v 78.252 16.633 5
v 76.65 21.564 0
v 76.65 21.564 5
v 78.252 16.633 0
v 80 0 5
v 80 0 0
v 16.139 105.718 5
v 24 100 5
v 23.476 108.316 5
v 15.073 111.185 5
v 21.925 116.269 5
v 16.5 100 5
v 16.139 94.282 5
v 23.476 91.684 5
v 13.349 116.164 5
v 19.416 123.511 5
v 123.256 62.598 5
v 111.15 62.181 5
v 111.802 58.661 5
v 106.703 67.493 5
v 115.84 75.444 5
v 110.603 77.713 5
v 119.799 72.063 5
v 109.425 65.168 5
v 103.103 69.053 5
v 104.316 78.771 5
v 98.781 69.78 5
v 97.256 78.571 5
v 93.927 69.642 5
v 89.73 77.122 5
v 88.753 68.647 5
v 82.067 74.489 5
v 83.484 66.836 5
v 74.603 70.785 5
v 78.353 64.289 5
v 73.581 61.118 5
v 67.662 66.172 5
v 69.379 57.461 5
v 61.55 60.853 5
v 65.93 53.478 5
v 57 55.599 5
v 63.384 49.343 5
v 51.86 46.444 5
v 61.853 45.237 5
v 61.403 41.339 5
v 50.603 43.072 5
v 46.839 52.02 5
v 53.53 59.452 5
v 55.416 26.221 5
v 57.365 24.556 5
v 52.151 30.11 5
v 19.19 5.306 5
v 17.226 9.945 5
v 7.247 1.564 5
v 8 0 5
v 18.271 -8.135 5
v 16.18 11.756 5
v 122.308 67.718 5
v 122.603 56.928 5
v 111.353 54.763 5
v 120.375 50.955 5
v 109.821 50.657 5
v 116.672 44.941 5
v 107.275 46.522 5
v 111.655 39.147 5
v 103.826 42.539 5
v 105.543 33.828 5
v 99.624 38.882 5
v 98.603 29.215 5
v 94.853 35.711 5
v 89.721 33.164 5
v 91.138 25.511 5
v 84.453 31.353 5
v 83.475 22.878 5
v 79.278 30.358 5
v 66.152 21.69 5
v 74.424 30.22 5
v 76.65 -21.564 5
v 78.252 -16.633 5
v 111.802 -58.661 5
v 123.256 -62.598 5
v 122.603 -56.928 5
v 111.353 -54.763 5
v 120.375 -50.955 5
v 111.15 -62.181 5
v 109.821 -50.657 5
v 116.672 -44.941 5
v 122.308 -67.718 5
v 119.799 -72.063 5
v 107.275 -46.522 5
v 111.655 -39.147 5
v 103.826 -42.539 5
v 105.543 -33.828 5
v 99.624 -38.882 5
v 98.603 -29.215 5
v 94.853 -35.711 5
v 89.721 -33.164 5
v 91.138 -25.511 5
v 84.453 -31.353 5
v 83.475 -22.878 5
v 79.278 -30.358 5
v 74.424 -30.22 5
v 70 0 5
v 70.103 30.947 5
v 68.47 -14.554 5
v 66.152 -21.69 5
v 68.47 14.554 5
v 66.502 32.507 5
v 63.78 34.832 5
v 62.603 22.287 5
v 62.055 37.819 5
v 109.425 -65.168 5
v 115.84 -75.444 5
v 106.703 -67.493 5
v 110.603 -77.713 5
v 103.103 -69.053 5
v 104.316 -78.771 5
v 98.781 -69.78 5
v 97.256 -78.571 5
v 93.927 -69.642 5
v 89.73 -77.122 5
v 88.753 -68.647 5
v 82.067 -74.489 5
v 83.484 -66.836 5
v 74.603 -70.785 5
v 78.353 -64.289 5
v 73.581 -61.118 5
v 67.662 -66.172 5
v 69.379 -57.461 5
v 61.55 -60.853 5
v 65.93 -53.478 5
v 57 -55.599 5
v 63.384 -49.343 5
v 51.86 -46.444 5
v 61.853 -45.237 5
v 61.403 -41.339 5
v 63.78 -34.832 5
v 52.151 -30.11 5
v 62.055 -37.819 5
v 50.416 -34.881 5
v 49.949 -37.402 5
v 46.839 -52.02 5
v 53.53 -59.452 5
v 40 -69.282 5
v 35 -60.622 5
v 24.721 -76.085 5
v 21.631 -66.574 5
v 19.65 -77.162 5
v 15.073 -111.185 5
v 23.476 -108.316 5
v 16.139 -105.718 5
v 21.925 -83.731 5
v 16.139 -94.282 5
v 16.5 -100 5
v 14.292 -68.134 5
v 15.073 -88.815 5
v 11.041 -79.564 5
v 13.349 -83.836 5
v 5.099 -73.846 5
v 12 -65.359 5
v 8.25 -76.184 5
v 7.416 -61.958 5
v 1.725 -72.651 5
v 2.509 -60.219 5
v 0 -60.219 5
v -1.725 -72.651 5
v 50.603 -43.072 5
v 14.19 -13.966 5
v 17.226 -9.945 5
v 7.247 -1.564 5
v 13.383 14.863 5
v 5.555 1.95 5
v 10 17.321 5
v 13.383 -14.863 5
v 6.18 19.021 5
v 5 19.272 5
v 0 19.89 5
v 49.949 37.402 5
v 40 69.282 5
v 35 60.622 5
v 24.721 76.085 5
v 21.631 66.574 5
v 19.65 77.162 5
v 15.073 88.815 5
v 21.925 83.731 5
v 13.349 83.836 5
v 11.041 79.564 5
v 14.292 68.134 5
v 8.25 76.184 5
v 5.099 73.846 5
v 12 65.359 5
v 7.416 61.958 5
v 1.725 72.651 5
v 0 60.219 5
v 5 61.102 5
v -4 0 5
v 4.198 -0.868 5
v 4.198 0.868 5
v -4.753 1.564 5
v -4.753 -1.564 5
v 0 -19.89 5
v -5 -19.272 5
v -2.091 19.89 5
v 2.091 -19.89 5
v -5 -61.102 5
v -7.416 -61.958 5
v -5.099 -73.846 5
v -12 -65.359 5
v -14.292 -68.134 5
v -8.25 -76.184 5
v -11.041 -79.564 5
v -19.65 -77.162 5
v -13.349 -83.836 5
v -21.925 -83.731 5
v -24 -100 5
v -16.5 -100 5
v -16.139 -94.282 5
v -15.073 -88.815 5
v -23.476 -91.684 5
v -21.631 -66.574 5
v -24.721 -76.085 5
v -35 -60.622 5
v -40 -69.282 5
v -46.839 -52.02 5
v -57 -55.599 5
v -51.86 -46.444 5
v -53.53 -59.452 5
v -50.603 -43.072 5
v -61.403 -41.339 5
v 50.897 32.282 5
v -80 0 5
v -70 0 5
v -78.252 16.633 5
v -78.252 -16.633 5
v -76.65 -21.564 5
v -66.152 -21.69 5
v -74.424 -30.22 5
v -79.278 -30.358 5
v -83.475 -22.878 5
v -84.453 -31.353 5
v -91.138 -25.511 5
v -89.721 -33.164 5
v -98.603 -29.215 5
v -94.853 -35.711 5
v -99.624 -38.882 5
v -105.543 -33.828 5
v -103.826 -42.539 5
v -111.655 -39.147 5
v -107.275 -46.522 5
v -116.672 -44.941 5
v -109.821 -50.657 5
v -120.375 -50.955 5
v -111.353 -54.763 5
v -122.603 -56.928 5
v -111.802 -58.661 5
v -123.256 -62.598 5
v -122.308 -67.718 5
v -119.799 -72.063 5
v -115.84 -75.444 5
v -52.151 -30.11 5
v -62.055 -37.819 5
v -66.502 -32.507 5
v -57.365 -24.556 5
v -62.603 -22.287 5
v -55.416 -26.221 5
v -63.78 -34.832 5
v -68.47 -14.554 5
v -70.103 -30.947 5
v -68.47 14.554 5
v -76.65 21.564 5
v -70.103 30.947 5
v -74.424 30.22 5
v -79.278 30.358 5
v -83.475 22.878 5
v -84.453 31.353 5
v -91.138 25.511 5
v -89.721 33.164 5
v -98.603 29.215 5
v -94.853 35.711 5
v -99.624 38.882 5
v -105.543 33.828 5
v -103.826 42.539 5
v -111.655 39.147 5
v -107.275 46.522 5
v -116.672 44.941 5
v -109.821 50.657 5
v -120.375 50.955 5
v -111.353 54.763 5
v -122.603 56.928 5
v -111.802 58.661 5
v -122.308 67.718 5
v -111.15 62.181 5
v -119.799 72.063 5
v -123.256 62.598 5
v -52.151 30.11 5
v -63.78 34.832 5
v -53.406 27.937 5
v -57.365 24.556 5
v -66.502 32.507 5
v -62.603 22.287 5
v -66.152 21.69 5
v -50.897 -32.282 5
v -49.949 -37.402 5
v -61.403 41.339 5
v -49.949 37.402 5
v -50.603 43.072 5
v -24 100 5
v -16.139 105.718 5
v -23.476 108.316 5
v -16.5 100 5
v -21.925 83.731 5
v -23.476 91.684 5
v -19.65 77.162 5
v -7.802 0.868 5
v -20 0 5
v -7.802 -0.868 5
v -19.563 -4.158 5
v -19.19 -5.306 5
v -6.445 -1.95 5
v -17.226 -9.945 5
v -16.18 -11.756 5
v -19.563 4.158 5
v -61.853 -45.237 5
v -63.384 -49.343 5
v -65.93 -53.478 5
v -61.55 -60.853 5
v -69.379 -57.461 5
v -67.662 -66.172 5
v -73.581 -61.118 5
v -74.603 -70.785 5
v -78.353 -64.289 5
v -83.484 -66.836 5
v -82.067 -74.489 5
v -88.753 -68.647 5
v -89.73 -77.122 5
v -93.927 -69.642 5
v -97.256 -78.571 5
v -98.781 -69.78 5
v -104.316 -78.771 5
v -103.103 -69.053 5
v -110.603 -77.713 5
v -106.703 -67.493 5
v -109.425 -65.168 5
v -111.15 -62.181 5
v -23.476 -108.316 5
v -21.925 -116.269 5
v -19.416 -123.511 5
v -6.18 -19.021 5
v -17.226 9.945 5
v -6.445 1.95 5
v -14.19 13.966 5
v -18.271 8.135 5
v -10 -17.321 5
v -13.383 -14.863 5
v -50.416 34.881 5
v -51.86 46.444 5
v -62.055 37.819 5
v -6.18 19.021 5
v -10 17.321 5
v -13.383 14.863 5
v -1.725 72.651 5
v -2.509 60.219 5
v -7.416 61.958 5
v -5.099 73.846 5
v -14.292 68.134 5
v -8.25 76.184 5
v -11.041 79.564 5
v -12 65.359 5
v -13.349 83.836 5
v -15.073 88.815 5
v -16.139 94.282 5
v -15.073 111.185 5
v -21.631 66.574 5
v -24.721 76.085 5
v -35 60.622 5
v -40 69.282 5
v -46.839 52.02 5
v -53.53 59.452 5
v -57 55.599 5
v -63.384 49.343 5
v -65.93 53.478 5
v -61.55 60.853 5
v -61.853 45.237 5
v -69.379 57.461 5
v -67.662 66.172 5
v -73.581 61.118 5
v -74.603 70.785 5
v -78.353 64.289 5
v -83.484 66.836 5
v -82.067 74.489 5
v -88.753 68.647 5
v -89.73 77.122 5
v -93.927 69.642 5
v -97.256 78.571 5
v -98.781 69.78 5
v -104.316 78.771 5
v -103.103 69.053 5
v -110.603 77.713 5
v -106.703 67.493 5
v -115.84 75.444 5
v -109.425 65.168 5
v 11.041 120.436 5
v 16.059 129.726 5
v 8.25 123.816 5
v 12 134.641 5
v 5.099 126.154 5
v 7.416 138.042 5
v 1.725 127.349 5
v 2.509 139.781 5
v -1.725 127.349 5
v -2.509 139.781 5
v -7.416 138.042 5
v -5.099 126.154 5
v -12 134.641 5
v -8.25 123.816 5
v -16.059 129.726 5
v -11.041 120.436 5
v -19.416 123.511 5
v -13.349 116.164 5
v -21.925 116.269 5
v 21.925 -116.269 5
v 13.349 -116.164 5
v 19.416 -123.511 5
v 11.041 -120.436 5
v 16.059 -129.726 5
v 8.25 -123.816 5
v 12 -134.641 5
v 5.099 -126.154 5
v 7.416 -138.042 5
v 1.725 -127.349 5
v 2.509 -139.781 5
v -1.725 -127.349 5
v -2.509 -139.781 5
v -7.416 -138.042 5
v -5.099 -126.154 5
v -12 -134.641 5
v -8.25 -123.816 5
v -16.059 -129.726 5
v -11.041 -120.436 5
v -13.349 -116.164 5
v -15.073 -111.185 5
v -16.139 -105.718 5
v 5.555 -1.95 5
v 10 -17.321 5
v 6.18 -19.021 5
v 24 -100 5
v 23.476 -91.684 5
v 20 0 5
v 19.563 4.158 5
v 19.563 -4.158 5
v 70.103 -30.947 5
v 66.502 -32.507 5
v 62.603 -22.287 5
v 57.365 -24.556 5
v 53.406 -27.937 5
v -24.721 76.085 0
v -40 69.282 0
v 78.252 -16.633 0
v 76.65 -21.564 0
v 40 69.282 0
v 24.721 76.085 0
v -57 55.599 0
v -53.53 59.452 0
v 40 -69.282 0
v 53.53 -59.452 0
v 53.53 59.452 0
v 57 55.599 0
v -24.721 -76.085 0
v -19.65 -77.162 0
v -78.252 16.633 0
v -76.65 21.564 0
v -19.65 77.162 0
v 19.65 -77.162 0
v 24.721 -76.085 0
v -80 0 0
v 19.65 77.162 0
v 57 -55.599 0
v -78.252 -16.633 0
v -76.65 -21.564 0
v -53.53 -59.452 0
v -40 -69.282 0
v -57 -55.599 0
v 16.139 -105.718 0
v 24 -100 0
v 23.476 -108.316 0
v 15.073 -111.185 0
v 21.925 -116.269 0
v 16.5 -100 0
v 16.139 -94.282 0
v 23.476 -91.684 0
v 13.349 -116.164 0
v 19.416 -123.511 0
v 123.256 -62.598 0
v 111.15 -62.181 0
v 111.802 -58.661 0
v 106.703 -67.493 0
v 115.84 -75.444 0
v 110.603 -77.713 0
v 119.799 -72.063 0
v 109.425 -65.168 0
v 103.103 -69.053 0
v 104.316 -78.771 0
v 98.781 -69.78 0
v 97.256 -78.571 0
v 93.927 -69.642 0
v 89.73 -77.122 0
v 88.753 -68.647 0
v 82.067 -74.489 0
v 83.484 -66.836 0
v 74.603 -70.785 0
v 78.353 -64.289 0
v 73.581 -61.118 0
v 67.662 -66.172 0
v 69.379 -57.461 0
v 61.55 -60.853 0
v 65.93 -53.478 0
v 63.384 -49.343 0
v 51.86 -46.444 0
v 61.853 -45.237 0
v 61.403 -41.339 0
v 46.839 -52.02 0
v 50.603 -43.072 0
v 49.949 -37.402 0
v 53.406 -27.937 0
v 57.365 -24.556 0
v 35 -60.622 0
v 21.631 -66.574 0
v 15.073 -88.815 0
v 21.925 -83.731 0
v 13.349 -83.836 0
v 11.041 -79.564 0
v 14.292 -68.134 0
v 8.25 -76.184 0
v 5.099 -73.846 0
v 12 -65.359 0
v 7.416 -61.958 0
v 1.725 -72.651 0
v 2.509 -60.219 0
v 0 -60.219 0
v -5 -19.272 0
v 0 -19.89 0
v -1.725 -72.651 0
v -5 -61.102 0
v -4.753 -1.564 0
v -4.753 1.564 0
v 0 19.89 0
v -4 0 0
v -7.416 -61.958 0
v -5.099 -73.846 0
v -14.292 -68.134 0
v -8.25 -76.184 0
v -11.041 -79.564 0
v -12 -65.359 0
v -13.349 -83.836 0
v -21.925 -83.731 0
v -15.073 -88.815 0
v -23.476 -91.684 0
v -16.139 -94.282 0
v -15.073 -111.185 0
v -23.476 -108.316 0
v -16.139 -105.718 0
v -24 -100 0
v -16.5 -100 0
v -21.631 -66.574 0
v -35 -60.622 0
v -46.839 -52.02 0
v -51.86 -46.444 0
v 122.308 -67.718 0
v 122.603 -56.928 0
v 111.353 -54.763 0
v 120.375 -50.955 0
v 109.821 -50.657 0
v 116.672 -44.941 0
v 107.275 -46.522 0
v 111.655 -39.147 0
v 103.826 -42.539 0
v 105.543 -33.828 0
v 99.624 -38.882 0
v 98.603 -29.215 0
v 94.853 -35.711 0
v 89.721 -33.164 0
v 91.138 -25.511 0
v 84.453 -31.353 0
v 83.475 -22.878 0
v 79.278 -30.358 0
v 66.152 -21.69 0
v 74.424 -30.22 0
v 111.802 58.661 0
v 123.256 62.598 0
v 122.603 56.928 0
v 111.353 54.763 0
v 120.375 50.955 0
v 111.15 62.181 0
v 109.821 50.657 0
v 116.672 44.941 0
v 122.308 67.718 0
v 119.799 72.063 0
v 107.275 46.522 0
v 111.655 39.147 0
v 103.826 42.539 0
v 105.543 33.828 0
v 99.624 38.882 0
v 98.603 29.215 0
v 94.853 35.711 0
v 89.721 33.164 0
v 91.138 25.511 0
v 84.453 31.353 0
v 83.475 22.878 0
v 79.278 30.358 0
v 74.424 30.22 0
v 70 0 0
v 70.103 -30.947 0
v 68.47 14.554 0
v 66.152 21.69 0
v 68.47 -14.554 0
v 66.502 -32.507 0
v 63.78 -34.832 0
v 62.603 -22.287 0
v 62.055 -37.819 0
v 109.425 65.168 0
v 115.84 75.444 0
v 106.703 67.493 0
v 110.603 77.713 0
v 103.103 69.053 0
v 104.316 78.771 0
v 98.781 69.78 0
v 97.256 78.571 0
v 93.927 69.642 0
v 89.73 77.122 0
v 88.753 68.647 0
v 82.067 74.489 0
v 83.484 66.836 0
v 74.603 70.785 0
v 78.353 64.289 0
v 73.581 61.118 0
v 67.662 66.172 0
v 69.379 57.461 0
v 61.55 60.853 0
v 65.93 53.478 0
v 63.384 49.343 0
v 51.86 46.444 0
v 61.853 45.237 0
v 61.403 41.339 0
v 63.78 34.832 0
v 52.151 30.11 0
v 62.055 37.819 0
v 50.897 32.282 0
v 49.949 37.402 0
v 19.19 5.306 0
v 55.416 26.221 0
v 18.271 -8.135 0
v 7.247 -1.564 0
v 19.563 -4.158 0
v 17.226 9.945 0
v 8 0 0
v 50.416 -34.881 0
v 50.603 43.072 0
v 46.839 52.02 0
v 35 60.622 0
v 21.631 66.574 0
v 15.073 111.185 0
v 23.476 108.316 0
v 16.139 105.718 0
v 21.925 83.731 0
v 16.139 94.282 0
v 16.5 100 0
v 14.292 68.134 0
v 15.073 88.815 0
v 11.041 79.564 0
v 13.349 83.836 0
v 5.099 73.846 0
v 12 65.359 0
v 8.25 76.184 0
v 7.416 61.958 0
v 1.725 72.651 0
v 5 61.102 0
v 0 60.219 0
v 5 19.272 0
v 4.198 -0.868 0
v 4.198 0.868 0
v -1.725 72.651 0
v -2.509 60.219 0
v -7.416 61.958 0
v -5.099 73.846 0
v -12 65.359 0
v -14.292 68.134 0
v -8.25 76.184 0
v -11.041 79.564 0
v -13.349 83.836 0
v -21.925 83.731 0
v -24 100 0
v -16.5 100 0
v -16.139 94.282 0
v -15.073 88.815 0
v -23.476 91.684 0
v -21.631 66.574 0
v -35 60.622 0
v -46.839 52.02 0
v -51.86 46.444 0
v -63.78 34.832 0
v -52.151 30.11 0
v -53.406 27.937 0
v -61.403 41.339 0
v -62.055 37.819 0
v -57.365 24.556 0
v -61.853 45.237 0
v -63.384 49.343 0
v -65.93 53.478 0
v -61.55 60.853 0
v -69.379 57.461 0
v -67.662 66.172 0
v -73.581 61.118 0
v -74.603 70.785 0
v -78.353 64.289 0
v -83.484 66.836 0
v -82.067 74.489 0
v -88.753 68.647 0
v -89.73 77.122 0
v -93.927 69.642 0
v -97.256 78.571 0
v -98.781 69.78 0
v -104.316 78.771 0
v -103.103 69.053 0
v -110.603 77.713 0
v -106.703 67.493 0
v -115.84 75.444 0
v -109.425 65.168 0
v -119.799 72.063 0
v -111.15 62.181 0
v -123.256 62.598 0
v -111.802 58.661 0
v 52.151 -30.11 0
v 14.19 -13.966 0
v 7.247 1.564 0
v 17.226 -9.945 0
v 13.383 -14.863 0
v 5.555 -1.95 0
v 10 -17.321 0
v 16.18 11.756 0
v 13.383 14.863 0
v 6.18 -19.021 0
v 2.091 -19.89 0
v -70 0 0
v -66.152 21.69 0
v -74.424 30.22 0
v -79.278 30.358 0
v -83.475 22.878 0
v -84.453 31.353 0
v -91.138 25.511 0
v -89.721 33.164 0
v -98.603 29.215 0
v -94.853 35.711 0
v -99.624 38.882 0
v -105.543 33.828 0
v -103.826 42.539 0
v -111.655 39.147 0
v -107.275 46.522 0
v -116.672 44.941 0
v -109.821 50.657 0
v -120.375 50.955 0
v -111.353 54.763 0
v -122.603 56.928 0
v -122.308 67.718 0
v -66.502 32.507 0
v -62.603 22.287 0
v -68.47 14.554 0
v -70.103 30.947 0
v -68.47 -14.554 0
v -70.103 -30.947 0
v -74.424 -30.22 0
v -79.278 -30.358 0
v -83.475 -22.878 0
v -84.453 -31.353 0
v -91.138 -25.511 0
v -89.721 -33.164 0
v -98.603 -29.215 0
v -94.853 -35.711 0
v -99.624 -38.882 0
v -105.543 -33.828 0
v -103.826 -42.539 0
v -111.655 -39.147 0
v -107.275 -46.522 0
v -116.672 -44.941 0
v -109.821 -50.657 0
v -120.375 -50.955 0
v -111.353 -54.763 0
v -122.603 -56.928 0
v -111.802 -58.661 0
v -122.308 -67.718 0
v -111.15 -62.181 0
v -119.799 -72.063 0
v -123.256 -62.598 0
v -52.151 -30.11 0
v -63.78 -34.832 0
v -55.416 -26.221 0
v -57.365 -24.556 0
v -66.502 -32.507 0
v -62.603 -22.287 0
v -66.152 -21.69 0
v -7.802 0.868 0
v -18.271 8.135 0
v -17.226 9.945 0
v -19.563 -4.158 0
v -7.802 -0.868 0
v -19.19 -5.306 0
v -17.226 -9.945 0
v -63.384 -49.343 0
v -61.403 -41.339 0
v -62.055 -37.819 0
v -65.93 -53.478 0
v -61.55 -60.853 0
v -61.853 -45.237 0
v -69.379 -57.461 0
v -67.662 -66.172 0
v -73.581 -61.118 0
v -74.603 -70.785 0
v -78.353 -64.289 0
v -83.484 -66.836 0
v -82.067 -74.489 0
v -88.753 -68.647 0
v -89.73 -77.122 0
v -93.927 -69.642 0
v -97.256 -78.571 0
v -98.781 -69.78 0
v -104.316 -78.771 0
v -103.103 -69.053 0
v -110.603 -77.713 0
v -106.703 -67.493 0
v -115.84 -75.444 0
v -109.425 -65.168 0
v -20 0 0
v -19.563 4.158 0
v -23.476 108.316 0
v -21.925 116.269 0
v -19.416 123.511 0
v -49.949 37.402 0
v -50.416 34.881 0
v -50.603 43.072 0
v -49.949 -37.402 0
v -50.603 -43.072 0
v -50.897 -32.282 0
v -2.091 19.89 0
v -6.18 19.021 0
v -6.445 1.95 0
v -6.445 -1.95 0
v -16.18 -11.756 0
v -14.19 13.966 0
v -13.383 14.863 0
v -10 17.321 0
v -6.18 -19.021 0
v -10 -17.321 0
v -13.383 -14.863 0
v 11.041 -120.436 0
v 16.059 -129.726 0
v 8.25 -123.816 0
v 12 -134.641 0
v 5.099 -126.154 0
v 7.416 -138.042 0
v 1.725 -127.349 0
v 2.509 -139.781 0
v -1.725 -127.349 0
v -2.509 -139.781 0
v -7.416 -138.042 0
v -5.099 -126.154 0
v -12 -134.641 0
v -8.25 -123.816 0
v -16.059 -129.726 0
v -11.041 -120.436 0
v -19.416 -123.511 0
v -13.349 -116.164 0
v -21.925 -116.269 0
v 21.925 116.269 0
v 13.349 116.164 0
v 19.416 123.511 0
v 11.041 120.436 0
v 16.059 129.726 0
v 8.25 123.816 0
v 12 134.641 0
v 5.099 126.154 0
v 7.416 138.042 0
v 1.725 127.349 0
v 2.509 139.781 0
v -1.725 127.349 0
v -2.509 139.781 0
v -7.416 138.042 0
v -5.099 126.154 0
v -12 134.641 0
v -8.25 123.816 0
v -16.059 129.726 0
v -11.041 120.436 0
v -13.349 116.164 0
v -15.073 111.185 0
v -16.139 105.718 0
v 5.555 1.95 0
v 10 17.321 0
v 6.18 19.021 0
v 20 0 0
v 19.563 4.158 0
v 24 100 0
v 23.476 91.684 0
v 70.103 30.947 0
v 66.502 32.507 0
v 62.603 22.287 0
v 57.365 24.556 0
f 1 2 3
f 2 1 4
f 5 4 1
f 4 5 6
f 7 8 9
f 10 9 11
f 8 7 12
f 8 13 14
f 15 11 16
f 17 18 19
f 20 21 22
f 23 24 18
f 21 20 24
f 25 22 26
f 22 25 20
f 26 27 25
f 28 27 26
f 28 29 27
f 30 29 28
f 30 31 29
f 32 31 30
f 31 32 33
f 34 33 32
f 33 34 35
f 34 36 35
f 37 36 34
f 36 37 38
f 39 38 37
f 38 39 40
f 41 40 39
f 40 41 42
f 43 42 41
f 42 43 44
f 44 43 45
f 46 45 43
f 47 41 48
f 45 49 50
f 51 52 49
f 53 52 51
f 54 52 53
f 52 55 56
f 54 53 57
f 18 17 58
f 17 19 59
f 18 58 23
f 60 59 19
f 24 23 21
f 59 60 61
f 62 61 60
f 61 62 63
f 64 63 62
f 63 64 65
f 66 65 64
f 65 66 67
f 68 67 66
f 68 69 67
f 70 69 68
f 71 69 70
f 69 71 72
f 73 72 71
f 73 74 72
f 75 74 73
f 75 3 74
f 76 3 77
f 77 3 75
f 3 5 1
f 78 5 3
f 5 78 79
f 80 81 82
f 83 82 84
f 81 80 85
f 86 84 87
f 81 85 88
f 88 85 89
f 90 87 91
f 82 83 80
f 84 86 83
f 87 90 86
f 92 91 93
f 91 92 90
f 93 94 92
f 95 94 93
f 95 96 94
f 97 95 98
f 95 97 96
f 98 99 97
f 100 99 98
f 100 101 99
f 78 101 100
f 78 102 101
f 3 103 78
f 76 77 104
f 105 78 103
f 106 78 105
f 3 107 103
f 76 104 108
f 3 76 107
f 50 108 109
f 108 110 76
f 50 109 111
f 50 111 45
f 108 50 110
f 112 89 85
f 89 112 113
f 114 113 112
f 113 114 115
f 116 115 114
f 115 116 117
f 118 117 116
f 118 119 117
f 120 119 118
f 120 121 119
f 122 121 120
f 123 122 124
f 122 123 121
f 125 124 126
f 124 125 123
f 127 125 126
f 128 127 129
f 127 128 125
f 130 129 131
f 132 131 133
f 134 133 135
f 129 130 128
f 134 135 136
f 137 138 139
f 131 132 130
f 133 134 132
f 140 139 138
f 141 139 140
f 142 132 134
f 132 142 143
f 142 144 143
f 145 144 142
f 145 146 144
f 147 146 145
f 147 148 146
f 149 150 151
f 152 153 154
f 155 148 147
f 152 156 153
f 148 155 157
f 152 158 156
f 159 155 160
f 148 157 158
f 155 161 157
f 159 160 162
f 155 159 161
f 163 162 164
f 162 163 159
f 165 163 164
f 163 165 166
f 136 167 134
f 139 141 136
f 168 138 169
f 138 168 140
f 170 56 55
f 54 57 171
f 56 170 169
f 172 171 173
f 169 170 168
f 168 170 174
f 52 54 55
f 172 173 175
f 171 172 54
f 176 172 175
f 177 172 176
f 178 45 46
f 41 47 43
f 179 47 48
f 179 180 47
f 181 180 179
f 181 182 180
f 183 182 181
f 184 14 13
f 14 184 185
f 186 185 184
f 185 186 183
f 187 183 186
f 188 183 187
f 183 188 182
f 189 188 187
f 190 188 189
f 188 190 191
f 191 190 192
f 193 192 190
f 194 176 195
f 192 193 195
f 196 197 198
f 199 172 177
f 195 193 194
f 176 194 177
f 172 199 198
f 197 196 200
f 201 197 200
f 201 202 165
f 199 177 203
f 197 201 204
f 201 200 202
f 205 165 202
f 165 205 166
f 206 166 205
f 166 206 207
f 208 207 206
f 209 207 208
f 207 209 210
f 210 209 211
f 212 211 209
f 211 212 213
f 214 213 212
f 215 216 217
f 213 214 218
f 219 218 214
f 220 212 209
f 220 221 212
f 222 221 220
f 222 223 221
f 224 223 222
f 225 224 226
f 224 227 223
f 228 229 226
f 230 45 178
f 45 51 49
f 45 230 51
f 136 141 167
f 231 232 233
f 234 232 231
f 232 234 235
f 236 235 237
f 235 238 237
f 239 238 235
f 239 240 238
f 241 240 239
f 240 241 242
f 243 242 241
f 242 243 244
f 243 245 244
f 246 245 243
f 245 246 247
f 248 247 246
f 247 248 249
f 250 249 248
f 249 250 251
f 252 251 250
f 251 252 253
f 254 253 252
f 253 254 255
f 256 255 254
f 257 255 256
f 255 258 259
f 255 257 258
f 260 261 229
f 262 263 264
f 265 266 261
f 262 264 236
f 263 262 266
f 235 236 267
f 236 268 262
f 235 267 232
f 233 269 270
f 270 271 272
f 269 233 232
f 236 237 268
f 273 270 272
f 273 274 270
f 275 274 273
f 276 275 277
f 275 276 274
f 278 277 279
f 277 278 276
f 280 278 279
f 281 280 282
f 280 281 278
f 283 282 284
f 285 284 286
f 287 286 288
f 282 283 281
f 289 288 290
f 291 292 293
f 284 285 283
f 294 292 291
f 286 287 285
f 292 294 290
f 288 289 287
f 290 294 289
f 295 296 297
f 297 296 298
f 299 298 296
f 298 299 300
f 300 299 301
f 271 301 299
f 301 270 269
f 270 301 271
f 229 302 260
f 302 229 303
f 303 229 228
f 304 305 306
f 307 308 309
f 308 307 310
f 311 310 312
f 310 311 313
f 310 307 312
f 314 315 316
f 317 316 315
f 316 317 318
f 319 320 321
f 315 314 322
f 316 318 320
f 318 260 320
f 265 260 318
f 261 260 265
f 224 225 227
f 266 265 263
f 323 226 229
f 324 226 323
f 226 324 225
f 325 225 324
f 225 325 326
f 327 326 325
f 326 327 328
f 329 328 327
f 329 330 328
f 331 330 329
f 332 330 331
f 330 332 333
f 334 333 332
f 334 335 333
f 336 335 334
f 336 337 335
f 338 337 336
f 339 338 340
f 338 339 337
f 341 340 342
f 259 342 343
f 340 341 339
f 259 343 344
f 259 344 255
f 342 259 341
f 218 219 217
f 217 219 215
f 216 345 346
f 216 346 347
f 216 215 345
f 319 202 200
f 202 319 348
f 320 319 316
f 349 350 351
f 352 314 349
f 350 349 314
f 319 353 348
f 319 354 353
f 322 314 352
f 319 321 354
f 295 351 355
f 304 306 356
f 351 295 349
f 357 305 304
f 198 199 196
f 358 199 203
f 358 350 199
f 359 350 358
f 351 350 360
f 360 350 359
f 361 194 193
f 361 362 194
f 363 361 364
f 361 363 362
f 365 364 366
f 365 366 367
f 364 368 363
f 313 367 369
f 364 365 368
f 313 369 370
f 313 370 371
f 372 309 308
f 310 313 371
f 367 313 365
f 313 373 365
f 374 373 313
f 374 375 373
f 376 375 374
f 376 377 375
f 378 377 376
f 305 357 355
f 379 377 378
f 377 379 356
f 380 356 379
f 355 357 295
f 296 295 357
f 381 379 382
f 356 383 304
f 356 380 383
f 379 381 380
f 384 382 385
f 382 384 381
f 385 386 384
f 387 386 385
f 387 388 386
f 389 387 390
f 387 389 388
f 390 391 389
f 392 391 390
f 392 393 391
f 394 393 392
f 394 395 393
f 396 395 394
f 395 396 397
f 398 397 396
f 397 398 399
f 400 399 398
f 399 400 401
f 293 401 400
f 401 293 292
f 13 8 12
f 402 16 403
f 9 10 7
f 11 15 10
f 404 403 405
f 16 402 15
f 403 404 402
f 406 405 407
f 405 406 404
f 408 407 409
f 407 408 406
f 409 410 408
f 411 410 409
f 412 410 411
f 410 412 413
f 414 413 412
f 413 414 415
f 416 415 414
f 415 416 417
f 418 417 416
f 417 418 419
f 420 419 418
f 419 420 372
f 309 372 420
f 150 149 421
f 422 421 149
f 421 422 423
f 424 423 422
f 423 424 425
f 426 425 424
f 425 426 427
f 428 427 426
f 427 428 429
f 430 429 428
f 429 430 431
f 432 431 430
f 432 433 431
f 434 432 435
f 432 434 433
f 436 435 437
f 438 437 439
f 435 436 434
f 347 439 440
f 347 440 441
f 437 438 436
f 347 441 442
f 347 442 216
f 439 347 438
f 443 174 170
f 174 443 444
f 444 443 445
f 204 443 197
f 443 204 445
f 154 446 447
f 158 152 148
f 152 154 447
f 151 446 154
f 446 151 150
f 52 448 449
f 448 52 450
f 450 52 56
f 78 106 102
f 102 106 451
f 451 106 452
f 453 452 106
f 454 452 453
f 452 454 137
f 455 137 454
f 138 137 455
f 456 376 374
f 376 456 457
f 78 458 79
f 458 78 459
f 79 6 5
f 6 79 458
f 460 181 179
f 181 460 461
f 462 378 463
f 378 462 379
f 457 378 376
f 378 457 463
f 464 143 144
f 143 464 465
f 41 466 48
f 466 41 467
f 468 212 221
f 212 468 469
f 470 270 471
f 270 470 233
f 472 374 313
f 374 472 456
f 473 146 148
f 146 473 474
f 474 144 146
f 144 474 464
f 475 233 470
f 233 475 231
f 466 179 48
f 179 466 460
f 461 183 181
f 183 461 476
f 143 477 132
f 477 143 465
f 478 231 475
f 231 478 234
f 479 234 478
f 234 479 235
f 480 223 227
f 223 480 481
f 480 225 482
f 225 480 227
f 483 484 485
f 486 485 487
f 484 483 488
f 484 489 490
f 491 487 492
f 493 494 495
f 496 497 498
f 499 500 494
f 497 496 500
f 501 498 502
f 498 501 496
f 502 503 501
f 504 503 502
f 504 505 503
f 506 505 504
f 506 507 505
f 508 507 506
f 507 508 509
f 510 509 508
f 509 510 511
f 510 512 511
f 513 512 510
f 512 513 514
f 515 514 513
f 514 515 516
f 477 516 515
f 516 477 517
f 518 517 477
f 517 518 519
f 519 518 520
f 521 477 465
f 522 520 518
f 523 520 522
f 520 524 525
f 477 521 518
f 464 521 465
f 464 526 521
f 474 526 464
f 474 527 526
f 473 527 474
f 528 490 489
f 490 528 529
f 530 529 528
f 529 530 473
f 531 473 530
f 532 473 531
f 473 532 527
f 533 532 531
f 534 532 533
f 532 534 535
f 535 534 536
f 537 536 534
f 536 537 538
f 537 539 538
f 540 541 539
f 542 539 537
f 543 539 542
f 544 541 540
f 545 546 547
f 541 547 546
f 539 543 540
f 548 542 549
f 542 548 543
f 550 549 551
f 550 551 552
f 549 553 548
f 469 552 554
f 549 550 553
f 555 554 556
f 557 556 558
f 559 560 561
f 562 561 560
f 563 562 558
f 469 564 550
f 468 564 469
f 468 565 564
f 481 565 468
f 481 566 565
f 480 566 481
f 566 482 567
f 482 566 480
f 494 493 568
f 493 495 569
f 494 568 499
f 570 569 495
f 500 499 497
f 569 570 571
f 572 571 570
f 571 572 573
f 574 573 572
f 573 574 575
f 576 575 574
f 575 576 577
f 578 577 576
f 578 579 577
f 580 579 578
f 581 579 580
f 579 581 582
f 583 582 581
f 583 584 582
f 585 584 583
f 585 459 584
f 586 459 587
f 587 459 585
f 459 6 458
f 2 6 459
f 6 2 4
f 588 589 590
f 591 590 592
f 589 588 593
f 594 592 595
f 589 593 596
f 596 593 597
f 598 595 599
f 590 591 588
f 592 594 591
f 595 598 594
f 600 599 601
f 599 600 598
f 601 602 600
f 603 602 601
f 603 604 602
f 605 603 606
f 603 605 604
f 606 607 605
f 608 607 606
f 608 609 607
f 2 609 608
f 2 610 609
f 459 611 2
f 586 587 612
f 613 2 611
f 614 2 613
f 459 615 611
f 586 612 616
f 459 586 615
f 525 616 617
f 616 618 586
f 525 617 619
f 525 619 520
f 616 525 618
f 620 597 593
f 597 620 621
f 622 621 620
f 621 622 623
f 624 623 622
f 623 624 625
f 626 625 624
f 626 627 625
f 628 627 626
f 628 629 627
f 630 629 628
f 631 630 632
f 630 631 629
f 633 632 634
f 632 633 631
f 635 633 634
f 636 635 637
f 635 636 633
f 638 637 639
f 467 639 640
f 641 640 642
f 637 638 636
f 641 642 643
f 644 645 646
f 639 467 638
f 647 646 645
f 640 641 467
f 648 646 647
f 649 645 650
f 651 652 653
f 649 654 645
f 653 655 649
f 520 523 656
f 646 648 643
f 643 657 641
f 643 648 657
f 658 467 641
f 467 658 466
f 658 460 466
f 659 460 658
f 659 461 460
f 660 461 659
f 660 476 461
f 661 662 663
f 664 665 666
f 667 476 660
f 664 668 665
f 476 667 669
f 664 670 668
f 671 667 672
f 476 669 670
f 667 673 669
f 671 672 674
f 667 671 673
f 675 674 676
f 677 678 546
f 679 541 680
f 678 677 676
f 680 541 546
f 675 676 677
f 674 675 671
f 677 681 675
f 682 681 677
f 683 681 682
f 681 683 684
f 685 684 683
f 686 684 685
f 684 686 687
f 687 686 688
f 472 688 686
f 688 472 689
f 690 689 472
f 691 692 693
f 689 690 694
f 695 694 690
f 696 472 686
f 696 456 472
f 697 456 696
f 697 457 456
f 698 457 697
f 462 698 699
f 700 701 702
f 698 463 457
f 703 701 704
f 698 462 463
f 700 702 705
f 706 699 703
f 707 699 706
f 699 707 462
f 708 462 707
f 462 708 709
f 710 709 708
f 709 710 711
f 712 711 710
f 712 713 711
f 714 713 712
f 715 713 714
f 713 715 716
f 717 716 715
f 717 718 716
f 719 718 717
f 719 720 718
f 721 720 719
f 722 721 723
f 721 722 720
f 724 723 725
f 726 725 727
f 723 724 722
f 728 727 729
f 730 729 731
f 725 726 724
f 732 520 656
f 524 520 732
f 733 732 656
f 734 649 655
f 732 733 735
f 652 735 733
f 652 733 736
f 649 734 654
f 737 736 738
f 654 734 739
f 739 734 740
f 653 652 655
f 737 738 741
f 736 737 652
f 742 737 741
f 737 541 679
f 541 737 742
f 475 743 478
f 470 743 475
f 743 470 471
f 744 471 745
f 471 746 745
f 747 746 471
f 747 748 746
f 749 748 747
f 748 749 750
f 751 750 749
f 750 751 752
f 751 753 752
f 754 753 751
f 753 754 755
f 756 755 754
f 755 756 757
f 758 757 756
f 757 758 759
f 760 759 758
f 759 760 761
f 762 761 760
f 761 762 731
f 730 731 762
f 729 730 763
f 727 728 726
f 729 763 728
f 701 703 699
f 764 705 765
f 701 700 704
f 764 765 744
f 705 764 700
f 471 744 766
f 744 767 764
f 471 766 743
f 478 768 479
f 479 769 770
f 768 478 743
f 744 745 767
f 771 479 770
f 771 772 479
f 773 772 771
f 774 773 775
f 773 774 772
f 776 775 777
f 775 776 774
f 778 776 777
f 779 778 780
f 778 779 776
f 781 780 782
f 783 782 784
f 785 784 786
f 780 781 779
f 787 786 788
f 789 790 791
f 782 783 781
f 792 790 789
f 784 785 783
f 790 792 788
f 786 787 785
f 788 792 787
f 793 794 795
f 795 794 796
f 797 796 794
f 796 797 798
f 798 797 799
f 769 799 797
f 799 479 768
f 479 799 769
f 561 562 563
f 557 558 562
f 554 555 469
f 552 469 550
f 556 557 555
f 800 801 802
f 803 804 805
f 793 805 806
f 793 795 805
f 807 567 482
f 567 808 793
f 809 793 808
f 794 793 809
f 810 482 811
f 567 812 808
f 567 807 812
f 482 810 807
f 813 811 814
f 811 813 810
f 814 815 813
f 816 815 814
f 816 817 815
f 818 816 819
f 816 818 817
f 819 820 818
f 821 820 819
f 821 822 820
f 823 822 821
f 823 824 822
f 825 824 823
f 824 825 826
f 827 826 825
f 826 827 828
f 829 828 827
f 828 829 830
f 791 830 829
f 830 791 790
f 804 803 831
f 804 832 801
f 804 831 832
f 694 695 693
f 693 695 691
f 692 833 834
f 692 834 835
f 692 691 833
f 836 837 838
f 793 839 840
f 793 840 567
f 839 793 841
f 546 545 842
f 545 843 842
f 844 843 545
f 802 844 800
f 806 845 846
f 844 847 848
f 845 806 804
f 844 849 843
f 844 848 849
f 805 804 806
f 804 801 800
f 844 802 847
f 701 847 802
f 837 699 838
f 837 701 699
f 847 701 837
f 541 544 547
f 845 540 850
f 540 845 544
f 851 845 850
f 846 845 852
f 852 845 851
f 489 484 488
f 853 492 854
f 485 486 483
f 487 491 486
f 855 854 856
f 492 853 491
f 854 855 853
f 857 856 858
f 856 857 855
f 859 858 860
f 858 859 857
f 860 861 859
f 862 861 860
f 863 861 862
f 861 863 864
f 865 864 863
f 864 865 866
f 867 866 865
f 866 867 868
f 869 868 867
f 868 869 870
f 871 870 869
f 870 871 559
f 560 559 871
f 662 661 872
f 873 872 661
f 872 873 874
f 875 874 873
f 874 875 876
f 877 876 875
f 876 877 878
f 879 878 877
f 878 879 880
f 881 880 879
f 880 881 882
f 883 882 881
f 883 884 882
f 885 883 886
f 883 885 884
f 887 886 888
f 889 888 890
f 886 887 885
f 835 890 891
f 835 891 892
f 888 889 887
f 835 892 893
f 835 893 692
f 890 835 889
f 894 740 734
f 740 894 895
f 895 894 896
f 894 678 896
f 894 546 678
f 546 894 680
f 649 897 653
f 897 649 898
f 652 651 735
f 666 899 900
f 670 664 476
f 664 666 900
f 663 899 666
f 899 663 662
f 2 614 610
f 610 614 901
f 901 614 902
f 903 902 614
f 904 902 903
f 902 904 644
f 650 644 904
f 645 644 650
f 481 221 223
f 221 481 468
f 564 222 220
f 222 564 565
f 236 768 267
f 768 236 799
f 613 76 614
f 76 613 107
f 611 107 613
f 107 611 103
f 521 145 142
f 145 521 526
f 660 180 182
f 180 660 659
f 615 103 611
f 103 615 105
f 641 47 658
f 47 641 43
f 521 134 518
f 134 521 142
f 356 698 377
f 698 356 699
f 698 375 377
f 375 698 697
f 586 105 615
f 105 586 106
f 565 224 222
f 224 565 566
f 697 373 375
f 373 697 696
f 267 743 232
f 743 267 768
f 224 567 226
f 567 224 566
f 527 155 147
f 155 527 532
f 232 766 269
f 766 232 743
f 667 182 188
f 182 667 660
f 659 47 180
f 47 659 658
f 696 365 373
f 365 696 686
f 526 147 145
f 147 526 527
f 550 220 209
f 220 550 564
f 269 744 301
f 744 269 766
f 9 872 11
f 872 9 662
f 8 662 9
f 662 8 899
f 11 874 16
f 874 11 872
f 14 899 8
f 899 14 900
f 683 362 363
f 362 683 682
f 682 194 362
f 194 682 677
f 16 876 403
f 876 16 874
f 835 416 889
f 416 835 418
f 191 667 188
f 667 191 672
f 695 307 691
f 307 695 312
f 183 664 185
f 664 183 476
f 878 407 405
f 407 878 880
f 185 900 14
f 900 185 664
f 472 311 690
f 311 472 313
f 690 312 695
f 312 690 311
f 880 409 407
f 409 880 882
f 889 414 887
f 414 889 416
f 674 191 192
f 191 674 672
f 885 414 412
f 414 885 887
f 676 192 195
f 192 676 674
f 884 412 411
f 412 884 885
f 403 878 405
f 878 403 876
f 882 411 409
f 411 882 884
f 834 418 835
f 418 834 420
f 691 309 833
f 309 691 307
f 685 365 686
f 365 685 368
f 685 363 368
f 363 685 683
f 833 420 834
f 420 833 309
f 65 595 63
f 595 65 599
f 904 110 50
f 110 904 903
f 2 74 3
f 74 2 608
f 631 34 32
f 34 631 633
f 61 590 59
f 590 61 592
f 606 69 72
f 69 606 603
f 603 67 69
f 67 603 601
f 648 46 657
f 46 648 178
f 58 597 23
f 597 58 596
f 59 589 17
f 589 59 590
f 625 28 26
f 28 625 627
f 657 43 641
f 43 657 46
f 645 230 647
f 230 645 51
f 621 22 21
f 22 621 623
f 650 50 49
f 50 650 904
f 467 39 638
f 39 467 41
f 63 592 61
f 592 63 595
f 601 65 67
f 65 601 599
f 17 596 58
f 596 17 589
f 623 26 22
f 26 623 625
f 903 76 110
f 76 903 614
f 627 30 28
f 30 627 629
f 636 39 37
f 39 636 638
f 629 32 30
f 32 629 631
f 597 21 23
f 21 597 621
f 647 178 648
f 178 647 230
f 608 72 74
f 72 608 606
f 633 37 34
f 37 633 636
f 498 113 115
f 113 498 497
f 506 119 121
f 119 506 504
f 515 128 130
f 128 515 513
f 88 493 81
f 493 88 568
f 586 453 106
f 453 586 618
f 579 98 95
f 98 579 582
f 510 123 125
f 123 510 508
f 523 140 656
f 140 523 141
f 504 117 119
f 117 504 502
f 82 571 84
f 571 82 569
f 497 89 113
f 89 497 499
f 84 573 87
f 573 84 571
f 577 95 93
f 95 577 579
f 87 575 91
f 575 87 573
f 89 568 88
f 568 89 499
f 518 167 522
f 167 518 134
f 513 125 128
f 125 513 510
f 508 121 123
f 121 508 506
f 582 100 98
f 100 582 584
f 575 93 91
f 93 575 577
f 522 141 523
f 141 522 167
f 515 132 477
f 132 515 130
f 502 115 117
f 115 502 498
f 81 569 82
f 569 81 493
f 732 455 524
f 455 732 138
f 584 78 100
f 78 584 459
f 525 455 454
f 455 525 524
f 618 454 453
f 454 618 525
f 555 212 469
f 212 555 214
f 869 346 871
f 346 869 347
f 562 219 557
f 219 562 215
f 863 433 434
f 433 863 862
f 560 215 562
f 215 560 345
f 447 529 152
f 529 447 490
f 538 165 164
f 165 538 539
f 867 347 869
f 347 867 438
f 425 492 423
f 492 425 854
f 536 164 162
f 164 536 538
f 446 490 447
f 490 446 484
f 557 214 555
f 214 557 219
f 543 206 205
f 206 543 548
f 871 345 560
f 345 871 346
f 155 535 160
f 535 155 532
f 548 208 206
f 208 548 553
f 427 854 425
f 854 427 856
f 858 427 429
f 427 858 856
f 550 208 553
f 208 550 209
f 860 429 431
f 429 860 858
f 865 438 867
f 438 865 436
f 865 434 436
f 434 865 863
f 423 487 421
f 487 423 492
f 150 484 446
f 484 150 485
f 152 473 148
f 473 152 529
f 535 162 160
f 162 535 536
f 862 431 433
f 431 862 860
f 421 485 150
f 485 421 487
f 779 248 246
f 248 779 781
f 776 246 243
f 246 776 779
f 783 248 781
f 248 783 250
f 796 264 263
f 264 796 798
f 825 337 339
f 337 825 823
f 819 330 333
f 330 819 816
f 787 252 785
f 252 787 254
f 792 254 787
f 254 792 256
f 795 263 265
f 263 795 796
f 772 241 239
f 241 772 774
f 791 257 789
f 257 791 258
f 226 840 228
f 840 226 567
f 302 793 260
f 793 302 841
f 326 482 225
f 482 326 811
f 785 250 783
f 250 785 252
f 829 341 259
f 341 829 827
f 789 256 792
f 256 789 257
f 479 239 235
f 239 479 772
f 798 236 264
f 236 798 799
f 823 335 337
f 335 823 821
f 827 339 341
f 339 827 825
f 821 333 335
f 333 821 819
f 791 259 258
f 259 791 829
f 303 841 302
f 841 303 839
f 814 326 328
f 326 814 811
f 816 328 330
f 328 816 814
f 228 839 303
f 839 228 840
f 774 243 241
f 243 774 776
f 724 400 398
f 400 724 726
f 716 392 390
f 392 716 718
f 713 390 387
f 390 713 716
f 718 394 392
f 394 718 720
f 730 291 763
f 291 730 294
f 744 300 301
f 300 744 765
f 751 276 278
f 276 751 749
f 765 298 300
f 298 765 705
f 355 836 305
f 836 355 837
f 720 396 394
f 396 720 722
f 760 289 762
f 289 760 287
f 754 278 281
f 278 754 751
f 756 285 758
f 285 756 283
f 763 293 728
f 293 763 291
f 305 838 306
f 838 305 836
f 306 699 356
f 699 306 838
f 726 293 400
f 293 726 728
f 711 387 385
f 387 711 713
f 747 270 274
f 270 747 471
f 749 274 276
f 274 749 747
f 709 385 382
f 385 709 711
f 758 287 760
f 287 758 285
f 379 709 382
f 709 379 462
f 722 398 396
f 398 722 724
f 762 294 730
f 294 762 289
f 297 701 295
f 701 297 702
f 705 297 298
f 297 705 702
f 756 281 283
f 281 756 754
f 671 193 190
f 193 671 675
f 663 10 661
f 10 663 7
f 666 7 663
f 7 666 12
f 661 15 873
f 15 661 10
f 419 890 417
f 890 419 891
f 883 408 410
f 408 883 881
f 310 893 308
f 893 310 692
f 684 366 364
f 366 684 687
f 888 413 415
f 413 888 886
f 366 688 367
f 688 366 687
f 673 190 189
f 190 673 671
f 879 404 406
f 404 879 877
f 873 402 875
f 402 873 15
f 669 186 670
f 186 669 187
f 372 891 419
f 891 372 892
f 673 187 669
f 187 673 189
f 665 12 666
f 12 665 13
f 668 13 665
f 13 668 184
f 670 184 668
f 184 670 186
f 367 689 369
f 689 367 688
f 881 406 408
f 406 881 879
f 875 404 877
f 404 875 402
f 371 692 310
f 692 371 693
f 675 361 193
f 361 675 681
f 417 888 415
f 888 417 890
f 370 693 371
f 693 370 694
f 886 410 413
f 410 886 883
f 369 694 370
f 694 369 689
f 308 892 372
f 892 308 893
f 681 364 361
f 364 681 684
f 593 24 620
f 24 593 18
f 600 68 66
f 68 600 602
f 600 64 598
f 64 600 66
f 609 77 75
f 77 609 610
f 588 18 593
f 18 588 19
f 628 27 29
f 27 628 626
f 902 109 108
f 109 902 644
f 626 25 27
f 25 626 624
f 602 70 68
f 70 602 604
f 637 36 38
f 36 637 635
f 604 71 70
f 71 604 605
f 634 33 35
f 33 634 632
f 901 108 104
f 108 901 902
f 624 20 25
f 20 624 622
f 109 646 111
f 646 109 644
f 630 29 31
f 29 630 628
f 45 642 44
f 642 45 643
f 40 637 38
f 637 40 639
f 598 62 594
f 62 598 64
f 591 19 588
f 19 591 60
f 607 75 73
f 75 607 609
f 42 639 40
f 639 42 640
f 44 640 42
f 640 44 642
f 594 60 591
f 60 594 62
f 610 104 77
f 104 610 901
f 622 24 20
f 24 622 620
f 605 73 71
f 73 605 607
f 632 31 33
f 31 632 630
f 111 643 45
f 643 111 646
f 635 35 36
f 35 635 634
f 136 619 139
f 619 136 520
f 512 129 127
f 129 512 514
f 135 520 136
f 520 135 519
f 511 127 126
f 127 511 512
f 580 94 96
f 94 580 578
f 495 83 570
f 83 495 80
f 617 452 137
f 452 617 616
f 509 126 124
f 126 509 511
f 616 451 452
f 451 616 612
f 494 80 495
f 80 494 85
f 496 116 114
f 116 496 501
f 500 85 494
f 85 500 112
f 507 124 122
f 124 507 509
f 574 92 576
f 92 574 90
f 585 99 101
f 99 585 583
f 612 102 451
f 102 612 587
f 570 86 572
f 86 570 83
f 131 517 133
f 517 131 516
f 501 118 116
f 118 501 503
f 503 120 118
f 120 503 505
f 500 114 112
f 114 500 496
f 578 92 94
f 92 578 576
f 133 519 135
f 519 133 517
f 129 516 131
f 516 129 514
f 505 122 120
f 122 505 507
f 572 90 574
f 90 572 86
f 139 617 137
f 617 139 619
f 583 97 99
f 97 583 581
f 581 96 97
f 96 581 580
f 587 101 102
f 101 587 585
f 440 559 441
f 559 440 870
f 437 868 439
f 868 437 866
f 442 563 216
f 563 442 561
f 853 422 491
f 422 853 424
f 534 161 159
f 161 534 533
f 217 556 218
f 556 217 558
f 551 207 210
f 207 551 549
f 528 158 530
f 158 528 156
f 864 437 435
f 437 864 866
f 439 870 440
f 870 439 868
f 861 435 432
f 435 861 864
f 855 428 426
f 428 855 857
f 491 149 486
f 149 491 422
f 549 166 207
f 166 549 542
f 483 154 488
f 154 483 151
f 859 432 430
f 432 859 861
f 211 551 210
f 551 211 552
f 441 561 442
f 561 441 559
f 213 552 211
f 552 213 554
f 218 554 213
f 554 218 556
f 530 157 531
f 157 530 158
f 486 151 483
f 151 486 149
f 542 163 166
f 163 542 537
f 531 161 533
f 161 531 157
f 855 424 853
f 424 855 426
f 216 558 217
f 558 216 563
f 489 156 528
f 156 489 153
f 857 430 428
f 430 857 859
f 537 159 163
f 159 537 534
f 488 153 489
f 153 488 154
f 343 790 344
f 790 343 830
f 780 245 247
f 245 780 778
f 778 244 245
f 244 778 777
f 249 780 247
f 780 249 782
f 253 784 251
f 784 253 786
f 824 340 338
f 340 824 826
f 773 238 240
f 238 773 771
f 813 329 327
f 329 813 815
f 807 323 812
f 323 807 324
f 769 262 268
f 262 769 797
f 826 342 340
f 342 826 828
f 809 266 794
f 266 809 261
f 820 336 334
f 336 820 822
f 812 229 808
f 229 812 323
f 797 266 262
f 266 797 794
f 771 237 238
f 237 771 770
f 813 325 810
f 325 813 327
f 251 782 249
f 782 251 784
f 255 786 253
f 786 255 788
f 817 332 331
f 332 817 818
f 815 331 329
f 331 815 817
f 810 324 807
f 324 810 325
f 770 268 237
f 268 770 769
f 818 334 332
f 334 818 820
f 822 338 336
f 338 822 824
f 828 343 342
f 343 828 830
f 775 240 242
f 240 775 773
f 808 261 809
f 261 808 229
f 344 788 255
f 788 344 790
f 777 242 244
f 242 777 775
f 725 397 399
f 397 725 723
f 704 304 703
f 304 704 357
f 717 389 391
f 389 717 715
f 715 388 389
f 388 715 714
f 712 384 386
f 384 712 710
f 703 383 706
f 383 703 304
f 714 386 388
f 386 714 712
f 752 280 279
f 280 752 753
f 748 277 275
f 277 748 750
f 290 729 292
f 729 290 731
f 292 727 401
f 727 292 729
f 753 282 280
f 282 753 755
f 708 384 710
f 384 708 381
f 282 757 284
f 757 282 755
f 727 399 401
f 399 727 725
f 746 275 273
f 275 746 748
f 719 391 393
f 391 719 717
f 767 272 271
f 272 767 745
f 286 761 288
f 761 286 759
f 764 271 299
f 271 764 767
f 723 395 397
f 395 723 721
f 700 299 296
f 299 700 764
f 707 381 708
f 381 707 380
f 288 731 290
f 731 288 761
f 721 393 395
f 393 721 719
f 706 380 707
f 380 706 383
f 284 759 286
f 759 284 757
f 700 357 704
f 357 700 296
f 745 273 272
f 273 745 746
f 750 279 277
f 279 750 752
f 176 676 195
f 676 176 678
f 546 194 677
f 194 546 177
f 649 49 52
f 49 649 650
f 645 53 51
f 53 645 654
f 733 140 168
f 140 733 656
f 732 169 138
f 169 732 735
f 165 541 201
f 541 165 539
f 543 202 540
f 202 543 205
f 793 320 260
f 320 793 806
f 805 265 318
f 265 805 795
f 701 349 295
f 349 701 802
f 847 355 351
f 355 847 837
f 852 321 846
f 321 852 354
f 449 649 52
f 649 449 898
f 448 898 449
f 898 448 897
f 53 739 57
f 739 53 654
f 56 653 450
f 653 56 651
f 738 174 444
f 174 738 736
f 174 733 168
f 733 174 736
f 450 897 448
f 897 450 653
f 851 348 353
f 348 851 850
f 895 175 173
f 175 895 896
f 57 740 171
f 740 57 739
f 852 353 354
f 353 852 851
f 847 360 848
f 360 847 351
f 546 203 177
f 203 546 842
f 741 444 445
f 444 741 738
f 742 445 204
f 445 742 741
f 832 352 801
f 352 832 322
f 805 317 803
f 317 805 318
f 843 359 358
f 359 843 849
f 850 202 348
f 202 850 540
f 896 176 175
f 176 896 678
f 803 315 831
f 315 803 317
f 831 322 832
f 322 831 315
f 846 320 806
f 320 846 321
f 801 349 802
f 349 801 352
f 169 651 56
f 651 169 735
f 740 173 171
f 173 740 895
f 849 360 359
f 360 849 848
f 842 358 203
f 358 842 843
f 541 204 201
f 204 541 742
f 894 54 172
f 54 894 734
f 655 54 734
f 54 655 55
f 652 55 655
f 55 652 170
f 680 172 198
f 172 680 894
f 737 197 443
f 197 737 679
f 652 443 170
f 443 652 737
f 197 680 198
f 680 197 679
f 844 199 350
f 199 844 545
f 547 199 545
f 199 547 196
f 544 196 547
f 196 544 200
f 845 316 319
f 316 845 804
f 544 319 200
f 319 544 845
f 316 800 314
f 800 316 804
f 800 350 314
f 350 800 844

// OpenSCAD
altura = 5;
radio  = 80;
burbujas = 6;
radio_burbujas = radio / 5;
desplazamiento_burbuja = 20;
escala = [1.5,2.5,1];


echo(version=version());

module pieza() {
    
    difference() {
        union() {
            difference() {
                cylinder(h = altura, r = radio);
                translate([0,0,-6])
                cylinder(h = altura+12, r = radio-10);
            }

            for (i = [0:burbujas-1]) {
                echo(360*i/burbujas, sin(360*i/burbujas)*(radio+desplazamiento_burbuja),cos(360*i/burbujas)*(radio+desplazamiento_burbuja));
                translate([sin(360*i/burbujas)*(radio+desplazamiento_burbuja), cos(360*i/burbujas)*(radio+desplazamiento_burbuja), 0 ])
                rotate([0,0,0-360*i/burbujas])
                scale(escala) 
                cylinder(h = altura, r=radio_burbujas);
            }
        }

        color([1,0,0])
        for (i = [0:burbujas-1]) {
            echo(i, 360*i/burbujas, sin(360*i/burbujas)*(radio+desplazamiento_burbuja), cos(360*i/burbujas)*(radio+desplazamiento_burbuja));
            translate([sin(360*i/burbujas)*(radio+desplazamiento_burbuja), cos(360*i/burbujas)*(radio+desplazamiento_burbuja), -6 ])
            rotate([0,0,0-360*i/burbujas])
            scale(escala) 
            cylinder(h = altura+12, r=radio_burbujas-5);
        }
    }
    
    
    difference() {
        union() {
            for (i = [0:burbujas-1]) {
                rotate([0,0,0-360*i/burbujas])
                cube([5, radio-desplazamiento_burbuja+5, 5]);
            }
            cylinder(h = altura, r=20);
        }
    
        
        translate([6,0,-5])
        cylinder(h = altura+10, r=2);

        translate([-6,0,-5])
        cylinder(h = altura+10, r=2);
        
    }

}




pieza();



//rotate([0,0,90])
//scale([1.0,2.0,1.0]) 
//cylinder(h = altura, r=radio_burbujas);



        
